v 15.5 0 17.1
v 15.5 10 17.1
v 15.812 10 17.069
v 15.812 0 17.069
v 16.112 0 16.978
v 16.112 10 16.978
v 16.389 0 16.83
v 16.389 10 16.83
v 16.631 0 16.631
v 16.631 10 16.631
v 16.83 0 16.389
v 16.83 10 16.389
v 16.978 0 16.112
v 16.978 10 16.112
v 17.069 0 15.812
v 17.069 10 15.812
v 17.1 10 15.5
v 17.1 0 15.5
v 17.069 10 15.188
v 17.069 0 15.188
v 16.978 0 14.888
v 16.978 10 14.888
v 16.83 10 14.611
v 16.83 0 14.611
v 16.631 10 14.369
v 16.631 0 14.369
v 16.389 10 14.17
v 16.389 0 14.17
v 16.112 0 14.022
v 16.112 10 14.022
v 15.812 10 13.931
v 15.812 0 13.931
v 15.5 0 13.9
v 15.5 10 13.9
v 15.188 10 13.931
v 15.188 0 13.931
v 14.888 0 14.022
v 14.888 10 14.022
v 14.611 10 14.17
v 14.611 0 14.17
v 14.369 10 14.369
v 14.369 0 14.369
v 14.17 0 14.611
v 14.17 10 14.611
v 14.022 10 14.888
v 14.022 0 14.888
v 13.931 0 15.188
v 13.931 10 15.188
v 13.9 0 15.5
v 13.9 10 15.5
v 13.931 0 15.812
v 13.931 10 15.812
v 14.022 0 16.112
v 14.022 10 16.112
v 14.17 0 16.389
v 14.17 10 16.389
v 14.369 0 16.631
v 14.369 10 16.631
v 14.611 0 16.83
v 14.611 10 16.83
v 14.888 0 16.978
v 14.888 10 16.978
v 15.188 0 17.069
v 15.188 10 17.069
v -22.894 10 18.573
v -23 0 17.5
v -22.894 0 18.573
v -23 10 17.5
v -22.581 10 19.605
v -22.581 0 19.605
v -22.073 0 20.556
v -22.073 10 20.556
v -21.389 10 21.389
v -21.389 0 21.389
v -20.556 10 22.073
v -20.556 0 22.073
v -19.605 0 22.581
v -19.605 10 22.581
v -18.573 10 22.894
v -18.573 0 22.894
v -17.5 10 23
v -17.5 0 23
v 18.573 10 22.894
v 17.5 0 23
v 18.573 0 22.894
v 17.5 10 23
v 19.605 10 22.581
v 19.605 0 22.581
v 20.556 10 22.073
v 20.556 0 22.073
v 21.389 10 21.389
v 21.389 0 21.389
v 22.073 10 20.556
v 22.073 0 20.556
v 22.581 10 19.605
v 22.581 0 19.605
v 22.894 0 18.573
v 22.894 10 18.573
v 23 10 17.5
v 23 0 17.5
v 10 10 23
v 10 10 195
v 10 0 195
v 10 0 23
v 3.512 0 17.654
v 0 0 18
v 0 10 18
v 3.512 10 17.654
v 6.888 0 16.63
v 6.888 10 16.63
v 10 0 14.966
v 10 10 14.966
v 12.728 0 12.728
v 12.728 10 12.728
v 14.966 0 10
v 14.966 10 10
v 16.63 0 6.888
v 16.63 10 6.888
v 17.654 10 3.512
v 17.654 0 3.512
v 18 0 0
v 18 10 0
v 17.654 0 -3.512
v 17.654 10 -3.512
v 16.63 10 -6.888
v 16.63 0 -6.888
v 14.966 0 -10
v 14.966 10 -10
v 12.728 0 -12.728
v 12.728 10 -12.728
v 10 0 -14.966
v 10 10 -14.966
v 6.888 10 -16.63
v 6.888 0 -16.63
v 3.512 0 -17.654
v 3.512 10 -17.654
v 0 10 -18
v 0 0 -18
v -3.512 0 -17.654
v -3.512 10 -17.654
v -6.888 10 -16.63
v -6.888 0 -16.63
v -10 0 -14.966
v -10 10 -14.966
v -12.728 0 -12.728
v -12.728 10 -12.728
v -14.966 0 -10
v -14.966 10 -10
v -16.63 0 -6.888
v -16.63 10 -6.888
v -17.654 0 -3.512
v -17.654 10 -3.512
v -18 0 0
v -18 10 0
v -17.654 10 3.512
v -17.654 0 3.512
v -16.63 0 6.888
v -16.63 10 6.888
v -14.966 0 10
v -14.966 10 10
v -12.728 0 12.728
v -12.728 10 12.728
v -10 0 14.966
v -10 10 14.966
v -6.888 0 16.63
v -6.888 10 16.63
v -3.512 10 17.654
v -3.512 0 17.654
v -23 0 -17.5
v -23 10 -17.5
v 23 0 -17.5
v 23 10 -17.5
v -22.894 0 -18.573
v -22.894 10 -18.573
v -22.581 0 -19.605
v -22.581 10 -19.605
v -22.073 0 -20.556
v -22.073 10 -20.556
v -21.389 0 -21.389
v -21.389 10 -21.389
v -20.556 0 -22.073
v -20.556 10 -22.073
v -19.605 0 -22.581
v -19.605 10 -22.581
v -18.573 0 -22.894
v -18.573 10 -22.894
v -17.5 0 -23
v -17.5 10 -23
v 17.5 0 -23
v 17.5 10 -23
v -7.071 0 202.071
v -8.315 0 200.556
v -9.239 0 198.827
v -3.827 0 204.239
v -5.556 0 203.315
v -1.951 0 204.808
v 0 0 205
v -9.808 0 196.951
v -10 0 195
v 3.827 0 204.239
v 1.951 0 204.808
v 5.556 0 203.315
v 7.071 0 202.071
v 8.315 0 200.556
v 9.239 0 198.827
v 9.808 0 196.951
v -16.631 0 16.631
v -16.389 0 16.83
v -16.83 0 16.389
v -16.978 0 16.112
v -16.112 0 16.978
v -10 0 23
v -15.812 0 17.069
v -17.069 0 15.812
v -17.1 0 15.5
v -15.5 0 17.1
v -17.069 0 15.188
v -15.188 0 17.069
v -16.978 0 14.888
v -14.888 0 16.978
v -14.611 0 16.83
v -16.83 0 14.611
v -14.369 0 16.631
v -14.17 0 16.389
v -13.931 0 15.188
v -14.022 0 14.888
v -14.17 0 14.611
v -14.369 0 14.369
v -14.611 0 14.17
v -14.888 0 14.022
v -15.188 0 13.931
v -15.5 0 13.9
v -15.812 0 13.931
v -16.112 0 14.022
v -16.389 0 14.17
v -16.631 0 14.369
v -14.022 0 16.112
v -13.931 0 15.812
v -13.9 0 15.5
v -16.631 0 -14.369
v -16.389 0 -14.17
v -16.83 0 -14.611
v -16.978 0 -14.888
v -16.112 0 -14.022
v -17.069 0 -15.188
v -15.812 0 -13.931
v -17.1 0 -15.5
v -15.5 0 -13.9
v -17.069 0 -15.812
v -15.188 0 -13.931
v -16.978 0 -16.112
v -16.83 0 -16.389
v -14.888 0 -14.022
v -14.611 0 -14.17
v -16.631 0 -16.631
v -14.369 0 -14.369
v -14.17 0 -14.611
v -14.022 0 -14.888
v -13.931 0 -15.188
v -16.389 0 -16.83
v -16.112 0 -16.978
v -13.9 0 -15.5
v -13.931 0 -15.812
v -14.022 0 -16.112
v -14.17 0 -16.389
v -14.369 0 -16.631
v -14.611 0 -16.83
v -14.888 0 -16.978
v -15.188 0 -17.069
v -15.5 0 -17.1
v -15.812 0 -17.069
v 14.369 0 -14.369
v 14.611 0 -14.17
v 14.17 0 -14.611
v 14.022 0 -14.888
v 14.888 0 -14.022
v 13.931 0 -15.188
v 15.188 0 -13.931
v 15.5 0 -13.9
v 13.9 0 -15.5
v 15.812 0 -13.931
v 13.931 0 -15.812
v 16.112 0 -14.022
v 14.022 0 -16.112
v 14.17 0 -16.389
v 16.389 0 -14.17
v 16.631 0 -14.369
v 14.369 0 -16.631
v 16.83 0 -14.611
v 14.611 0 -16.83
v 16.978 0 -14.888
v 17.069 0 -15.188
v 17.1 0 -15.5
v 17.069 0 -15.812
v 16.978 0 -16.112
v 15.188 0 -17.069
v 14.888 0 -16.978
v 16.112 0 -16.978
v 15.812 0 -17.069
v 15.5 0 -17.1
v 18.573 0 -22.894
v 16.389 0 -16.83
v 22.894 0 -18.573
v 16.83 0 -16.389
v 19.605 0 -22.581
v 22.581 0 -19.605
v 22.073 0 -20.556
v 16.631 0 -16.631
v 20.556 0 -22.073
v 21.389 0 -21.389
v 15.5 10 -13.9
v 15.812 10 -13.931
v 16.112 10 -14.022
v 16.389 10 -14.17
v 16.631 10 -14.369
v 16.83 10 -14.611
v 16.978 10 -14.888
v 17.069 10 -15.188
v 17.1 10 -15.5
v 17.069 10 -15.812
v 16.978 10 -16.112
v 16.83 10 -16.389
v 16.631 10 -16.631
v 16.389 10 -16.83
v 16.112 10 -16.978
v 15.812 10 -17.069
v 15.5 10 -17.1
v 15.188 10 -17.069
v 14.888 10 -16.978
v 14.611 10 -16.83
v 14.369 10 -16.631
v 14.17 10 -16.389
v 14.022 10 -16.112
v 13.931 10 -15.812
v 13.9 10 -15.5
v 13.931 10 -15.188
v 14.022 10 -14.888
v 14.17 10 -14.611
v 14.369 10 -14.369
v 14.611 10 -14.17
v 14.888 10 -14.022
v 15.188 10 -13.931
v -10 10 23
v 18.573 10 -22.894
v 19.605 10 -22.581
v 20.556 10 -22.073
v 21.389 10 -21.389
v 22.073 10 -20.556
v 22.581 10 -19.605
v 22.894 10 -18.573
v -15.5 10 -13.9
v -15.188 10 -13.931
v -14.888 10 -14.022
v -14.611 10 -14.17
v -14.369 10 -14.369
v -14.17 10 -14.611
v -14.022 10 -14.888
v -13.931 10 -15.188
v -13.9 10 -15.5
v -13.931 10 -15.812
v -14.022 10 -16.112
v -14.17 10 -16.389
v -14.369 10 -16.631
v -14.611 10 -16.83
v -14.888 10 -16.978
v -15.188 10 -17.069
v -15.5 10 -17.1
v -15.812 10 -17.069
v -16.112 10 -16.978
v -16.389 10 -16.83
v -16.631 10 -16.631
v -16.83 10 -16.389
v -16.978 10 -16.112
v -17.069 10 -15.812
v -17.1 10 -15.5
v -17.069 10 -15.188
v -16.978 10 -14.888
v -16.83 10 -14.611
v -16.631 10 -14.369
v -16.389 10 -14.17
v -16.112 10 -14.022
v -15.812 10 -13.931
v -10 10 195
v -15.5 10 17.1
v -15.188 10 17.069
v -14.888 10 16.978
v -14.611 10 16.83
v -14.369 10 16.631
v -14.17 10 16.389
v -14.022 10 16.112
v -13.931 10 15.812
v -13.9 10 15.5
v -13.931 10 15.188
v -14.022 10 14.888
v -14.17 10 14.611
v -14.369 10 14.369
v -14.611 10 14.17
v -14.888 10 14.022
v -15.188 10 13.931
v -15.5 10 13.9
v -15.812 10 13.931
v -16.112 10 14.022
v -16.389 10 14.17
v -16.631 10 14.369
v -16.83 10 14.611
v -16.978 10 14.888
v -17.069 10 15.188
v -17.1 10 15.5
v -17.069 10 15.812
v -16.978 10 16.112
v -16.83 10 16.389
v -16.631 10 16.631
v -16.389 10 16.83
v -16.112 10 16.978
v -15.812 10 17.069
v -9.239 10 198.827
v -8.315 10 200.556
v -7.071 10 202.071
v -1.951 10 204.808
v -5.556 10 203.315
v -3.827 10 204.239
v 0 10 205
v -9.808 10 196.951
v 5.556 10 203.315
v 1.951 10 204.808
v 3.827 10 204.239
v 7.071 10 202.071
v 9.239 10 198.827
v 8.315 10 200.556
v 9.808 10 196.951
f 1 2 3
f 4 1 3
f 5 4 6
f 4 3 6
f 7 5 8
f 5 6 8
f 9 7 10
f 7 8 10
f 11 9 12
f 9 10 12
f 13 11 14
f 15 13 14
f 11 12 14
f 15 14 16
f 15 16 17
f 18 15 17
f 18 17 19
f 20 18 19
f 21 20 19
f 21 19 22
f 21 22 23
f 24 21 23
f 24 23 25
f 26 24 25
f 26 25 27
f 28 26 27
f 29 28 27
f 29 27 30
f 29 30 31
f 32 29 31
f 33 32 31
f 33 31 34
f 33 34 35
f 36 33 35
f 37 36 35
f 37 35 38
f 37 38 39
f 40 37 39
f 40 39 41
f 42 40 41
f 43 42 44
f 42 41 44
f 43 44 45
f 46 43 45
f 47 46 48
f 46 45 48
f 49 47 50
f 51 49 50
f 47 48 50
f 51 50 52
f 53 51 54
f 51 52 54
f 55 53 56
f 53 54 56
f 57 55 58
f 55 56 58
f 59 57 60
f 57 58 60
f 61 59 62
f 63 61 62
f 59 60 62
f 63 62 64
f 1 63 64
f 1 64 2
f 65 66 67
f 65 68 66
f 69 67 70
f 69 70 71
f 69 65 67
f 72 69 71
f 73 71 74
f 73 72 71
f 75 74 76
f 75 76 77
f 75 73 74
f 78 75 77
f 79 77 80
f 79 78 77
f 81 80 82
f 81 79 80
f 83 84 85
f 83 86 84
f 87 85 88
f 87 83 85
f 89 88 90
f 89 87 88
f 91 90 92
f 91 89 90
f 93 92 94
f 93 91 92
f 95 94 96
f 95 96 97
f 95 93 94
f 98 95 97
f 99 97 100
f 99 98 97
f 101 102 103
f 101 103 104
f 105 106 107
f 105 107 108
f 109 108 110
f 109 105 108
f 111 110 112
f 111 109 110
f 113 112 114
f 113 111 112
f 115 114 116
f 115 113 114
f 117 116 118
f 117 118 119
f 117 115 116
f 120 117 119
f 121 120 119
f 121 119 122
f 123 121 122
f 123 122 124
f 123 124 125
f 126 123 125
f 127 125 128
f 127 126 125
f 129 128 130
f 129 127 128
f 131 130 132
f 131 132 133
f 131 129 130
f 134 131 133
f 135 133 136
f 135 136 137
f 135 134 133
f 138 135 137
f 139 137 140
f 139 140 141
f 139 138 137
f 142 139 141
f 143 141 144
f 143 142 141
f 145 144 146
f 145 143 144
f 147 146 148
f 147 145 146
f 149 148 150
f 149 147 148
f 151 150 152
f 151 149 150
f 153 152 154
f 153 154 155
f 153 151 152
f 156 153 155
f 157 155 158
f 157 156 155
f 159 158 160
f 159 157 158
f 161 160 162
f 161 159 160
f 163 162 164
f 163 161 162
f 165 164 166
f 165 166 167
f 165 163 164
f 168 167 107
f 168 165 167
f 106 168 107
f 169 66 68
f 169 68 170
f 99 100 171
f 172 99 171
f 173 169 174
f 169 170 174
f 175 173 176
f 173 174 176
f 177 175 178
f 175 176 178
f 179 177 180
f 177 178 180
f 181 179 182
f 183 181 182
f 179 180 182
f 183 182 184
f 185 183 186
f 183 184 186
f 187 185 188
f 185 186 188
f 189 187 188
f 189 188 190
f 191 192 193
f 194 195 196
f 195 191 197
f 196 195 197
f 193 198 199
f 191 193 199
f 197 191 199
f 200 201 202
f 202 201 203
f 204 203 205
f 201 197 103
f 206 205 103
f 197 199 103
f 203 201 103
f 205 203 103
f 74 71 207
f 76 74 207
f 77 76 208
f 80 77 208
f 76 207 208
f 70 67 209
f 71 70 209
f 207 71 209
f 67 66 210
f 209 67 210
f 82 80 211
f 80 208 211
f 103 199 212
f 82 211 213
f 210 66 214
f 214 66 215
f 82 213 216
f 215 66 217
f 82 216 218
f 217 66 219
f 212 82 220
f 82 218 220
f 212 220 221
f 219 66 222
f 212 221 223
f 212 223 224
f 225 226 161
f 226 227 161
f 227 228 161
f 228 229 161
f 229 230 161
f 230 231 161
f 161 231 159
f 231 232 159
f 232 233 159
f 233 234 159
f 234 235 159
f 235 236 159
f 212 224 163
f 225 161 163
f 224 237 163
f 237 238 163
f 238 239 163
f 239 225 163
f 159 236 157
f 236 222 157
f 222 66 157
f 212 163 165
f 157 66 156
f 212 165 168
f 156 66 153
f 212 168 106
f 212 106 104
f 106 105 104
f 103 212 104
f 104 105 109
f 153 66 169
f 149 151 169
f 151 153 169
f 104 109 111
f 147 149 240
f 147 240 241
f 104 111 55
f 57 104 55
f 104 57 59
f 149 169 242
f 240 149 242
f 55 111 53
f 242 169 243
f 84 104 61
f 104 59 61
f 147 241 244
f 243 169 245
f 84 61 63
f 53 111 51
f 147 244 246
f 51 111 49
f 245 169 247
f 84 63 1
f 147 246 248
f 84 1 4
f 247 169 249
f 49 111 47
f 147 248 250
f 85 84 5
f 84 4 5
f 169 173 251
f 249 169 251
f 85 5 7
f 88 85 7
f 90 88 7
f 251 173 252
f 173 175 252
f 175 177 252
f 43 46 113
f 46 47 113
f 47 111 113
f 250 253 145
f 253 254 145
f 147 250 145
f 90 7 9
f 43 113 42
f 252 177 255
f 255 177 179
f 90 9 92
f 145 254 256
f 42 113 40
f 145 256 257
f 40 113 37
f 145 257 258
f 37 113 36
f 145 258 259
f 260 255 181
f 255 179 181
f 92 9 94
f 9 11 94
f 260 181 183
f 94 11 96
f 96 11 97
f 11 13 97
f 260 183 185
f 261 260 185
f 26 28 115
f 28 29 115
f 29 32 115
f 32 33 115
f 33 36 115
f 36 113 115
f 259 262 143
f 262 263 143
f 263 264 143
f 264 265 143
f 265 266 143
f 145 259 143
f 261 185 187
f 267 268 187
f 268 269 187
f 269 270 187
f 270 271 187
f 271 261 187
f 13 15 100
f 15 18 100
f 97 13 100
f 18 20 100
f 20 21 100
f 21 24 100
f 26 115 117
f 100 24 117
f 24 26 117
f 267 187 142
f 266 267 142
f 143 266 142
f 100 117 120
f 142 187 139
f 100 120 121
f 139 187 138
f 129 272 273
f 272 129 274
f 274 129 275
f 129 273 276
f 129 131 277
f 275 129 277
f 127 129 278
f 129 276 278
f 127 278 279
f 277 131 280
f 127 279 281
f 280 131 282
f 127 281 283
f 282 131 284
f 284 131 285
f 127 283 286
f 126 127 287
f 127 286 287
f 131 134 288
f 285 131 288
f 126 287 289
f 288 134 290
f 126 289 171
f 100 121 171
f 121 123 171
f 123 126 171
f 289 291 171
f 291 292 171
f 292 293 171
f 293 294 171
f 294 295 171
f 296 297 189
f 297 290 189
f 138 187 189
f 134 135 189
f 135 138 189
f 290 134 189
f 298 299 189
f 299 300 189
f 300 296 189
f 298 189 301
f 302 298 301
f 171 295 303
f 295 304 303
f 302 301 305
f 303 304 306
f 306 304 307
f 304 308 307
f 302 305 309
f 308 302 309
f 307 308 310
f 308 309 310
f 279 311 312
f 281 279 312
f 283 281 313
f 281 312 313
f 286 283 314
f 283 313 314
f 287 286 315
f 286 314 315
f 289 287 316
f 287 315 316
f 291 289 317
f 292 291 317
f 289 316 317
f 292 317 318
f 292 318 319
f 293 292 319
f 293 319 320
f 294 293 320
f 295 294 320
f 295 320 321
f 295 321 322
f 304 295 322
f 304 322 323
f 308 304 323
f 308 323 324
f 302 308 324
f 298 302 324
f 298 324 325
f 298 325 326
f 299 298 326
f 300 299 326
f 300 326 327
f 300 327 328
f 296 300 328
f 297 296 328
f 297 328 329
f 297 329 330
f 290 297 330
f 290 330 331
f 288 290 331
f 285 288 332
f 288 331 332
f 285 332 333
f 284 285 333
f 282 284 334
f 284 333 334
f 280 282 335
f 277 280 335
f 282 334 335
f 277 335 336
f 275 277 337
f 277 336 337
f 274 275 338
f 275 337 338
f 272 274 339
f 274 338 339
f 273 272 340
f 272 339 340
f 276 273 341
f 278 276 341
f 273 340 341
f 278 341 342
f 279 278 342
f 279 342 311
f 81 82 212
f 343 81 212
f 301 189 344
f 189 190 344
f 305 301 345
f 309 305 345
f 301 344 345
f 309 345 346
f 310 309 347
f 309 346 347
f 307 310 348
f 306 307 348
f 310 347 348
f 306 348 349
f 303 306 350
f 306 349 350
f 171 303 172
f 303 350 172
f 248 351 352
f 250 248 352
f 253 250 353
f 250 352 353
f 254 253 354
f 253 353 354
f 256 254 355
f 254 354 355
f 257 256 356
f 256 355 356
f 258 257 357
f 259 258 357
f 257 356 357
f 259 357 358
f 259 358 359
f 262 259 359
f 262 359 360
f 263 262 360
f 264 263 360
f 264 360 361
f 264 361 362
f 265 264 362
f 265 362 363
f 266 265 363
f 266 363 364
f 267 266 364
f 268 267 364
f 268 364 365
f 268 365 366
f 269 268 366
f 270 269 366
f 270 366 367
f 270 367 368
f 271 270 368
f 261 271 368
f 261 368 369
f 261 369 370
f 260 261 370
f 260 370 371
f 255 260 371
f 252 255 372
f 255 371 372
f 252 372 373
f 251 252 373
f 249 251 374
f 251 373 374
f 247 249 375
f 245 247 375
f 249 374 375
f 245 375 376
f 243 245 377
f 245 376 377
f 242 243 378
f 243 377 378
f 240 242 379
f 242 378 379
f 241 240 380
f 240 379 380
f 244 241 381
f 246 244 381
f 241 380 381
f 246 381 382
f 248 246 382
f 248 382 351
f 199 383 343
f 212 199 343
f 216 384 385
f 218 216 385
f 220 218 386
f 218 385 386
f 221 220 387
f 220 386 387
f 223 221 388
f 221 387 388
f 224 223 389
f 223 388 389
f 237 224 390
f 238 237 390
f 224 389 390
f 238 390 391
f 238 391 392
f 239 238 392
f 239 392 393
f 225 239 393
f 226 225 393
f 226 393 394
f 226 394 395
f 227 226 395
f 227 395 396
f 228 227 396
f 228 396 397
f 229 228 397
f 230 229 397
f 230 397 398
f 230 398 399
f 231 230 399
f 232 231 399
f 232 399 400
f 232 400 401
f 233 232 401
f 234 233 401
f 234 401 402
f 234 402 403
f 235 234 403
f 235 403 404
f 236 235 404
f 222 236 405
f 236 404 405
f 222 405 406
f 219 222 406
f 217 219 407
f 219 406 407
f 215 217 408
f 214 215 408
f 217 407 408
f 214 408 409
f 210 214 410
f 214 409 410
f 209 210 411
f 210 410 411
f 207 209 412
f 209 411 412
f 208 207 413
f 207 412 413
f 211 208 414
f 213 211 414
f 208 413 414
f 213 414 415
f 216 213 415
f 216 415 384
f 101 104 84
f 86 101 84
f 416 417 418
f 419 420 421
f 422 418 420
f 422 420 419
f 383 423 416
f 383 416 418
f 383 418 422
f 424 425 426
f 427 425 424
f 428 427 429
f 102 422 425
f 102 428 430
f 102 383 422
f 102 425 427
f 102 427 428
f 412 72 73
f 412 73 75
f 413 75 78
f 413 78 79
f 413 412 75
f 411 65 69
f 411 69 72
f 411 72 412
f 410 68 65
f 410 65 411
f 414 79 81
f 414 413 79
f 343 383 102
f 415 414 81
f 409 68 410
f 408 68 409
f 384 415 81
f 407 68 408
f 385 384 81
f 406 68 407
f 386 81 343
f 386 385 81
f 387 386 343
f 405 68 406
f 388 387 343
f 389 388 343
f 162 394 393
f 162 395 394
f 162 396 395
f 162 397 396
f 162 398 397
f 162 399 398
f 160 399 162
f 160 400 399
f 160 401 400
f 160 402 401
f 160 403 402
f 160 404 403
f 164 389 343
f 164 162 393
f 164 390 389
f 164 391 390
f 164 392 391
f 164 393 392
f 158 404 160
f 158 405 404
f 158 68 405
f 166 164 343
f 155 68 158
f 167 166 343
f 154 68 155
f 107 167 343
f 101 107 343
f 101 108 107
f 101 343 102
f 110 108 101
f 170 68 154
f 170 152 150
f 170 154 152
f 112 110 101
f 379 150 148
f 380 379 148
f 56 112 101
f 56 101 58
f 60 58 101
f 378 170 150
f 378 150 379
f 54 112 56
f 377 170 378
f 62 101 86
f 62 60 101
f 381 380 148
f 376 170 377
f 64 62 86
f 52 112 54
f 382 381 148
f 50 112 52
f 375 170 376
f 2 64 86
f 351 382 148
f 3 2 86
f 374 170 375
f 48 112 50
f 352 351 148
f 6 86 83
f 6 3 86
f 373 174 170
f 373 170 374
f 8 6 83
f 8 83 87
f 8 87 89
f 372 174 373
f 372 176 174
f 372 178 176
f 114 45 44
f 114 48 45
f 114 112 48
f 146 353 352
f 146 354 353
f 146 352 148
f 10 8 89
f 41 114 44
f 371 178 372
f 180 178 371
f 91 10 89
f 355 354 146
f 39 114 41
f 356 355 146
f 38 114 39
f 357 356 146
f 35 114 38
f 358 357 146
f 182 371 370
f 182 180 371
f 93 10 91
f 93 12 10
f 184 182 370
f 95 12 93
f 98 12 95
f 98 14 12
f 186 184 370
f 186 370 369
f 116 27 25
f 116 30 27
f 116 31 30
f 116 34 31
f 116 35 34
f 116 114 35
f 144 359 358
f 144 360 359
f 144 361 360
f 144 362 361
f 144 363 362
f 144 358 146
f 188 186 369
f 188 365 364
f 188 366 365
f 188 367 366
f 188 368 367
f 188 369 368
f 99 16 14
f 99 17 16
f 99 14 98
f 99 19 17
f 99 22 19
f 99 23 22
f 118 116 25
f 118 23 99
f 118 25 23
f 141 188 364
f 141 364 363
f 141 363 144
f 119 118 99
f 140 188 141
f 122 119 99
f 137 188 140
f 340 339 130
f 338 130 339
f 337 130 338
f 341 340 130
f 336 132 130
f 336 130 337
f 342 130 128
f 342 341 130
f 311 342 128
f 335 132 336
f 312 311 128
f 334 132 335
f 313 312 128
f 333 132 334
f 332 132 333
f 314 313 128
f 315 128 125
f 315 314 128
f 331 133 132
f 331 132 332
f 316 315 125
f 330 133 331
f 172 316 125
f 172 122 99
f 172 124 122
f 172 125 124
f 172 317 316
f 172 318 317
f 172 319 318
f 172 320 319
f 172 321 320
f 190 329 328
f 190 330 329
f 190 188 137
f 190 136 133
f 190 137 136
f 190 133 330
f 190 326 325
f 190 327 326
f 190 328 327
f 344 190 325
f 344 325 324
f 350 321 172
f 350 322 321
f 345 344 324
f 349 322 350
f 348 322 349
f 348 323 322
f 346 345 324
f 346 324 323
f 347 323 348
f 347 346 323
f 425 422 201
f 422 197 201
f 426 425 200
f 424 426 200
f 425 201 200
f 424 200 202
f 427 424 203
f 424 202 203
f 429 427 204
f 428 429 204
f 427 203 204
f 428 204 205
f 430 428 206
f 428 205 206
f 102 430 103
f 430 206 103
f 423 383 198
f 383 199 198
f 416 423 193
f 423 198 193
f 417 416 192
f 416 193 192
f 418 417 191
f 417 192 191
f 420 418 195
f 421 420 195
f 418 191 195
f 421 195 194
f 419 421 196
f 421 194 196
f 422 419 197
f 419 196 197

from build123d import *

# Parameters (mm, degrees)
SKETCH_2_W          = 46
SKETCH_2_H          = 46
SKETCH_2_R          = 18
EXTRUDE_1_DEPTH     = 10
FILLET_1_R          = 5.5
SKETCH_3_R          = 1.6
CUT_EXTRUDE_1_DEPTH = 35.029399054
SKETCH_4_W          = 20
SKETCH_4_H          = 182
EXTRUDE_2_DEPTH     = 10
FILLET_2_R          = 10


with BuildPart() as part:
    # 草图2 → 凸台-拉伸1 (new body)
    with BuildSketch(Plane(origin=(0, 0, 0), x_dir=(1, 0, 0), z_dir=(0, 1, 0))):
        Rectangle(SKETCH_2_W, SKETCH_2_H)
        with Locations(Location((0, 0, 0), (0, 0, 270))):
            Circle(SKETCH_2_R, mode=Mode.SUBTRACT)
    extrude(amount=EXTRUDE_1_DEPTH)

    # 圆角1
    fillet_1_edges = [part.edges().sort_by_distance(p)[0] for p in [
        (23, 5, 23),
        (-23, 5, 23),
        (-23, 5, -23),
        (23, 5, -23),
    ]]
    fillet(fillet_1_edges, radius=FILLET_1_R)

    # 草图3 → 切除-拉伸1 (cut, through all)
    with BuildSketch(Plane(origin=(0, 10, 0), x_dir=(1, 0, 0), z_dir=(0, 1, 0))):
        with Locations(Location((-15.5, 15.5, 0), (0, 0, 270))):
            Circle(SKETCH_3_R)
        with Locations(Location((15.5, 15.5, 0), (0, 0, 270))):
            Circle(SKETCH_3_R)
        with Locations(Location((-15.5, -15.5, 0), (0, 0, 270))):
            Circle(SKETCH_3_R)
        with Locations(Location((15.5, -15.5, 0), (0, 0, 270))):
            Circle(SKETCH_3_R)
    extrude(amount=-CUT_EXTRUDE_1_DEPTH, mode=Mode.SUBTRACT)

    # 草图4 → 凸台-拉伸2 (add)
    with BuildSketch(Plane(origin=(0, 10, 0), x_dir=(1, 0, 0), z_dir=(0, 1, 0))):
        with Locations((0, -114)):
            Rectangle(SKETCH_4_W, SKETCH_4_H)
    extrude(amount=-EXTRUDE_2_DEPTH)

    # 圆角2
    fillet_2_edges = [part.edges().sort_by_distance(p)[0] for p in [
        (-10, 5, 205),
        (10, 5, 205),
    ]]
    fillet(fillet_2_edges, radius=FILLET_2_R - 0.0001)  # a hair under: the kernel refuses the full size


solid = part.part
